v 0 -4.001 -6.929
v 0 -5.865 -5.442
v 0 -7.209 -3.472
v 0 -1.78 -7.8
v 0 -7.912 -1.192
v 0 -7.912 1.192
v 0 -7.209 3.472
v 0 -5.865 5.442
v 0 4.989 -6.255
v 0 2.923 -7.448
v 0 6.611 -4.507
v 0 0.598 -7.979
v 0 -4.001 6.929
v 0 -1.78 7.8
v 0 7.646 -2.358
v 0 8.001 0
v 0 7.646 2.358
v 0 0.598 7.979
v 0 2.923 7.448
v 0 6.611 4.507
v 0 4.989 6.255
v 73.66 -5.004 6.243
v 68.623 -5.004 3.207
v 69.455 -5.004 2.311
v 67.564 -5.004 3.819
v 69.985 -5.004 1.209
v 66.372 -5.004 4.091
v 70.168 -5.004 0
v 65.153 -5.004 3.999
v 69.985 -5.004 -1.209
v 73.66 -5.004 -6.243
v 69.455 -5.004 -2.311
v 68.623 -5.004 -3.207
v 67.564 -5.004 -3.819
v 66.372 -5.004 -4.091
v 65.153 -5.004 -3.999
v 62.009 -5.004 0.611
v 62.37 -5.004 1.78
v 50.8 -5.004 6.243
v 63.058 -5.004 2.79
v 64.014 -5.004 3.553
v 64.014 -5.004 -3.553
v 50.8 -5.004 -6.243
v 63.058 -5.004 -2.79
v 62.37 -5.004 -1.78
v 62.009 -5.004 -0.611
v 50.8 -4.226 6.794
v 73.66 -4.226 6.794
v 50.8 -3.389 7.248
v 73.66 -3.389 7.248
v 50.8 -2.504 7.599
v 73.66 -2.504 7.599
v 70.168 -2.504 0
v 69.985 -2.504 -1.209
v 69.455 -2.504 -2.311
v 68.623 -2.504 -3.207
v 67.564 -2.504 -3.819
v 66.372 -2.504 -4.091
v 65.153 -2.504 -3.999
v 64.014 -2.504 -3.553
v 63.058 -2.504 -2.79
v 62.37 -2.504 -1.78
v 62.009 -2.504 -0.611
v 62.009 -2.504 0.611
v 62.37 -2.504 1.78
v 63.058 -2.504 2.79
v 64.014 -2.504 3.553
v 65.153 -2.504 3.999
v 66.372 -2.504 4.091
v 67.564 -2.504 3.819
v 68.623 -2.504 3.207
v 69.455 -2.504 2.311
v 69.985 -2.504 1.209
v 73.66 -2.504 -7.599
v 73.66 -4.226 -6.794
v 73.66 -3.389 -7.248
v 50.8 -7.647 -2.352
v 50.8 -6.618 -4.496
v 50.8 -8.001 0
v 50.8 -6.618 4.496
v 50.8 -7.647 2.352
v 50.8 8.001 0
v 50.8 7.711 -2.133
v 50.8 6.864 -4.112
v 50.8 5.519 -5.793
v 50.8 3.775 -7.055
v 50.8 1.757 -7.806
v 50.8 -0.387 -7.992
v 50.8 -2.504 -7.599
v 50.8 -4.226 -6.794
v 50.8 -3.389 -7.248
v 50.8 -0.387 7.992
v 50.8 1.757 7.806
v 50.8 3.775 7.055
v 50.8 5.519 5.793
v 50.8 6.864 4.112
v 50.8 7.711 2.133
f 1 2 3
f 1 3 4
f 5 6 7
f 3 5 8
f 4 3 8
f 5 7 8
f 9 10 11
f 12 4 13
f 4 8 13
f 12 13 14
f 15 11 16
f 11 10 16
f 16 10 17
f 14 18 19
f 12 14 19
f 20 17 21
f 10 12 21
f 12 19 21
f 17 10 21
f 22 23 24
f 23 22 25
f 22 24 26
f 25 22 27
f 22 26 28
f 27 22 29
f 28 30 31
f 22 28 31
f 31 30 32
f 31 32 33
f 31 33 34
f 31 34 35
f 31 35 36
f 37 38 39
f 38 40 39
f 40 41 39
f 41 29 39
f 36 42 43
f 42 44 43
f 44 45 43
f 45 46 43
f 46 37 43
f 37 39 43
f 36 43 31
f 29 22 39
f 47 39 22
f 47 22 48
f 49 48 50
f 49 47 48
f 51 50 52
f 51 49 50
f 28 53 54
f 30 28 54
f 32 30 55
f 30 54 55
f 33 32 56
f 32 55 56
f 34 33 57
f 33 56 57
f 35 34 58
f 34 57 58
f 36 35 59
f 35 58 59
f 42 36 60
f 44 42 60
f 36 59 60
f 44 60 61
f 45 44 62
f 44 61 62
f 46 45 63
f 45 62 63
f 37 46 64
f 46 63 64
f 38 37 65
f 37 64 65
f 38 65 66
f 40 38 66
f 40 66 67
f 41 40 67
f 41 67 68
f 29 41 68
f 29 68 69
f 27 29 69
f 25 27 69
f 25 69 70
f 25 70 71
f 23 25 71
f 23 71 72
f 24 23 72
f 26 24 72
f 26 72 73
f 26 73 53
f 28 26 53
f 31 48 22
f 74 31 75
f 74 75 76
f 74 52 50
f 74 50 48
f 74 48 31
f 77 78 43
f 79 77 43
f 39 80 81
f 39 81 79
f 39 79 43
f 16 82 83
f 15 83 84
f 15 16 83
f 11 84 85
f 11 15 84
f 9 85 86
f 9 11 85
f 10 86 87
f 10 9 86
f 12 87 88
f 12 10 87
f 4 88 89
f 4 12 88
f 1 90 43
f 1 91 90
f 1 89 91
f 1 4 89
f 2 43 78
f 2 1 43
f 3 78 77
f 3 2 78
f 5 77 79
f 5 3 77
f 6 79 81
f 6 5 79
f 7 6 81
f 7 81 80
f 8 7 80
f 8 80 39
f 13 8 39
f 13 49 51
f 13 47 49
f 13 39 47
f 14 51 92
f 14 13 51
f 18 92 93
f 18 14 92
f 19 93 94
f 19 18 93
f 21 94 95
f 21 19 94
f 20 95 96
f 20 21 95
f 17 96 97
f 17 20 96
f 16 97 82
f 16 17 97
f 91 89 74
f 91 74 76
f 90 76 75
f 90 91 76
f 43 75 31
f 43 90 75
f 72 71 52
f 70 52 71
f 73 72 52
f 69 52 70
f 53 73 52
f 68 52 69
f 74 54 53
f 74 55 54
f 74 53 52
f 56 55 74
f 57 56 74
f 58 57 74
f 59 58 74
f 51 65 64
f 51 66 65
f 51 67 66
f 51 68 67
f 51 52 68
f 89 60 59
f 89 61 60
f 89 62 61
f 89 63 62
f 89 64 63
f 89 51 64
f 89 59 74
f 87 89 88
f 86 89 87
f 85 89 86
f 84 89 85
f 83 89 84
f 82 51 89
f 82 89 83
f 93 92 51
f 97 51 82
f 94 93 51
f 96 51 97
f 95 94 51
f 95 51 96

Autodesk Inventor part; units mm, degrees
ref_plane "YZ Plane" through (0, 0, 0) normal (1, 0, 0) x (0, 1, 0)
ref_plane "XZ Plane" through (0, 0, 0) normal (0, 1, 0) x (-1, 0, 0)
ref_plane "XY Plane" through (0, 0, 0) normal (0, 0, 1) x (1, 0, 0)
sketch "Sketch1" plane through (0, 0, 0) normal (1, 0, 0) x (0, 1, 0)
  circle A0 centre (0, 0) radius 8.001
  dimension "d0" = 16.002
extrude "Extrusion1" add sketch "Sketch1" along normal blind 50.8
sketch "Sketch2" plane through (50.8, 0, 0) normal (1, 0, 0) x (0, 0, -1)
  line L0 (-6.2432, -5.0038) -> (6.2432, -5.0038)
  line L1 (-7.5991, -2.5038) -> (7.5991, -2.5038)
  arc A0 (6.2432, -5.0038) -> (7.5991, -2.5038) centre (0, 0) ccw
  arc A1 (-7.5991, -2.5038) -> (-6.2432, -5.0038) centre (0, 0) ccw
  circle A2 centre (0, 0) radius 8.001 projected
  point P0 (7.0332, -3.8145)
  point P1 (-7.0332, -3.8145)
  dimension "d3" = 5.0038
  dimension "d4" = 2.5
extrude "Extrusion2" add sketch "Sketch2" along normal blind 22.86 contours A1 L1 A0 L0
sketch "Sketch3" plane through (50.8, -2.5038, 7.5991) normal (0, 1, 0) x (1, 0, 0)
  circle A0 centre (15.2654, 7.5991) radius 4.1021
  line L0 (0, 15.1983) -> (22.86, 15.1983) projected
  line L1 (0, 0) -> (22.86, 0) projected
  line L2 (0, 0) -> (0, 15.1983) projected
  point P0 (-50.8, 7.5991)
  dimension "d8" = 8.2042
  dimension "d9" = 7.5991
  dimension "d10" = 15.1983
  dimension "d13" = 15.2654
extrude "Extrusion3" cut sketch "Sketch3" against normal blind 15.0114
equation "\"d9\" = 0.5 * d10"
properties part number "Ring Connector model 4"
